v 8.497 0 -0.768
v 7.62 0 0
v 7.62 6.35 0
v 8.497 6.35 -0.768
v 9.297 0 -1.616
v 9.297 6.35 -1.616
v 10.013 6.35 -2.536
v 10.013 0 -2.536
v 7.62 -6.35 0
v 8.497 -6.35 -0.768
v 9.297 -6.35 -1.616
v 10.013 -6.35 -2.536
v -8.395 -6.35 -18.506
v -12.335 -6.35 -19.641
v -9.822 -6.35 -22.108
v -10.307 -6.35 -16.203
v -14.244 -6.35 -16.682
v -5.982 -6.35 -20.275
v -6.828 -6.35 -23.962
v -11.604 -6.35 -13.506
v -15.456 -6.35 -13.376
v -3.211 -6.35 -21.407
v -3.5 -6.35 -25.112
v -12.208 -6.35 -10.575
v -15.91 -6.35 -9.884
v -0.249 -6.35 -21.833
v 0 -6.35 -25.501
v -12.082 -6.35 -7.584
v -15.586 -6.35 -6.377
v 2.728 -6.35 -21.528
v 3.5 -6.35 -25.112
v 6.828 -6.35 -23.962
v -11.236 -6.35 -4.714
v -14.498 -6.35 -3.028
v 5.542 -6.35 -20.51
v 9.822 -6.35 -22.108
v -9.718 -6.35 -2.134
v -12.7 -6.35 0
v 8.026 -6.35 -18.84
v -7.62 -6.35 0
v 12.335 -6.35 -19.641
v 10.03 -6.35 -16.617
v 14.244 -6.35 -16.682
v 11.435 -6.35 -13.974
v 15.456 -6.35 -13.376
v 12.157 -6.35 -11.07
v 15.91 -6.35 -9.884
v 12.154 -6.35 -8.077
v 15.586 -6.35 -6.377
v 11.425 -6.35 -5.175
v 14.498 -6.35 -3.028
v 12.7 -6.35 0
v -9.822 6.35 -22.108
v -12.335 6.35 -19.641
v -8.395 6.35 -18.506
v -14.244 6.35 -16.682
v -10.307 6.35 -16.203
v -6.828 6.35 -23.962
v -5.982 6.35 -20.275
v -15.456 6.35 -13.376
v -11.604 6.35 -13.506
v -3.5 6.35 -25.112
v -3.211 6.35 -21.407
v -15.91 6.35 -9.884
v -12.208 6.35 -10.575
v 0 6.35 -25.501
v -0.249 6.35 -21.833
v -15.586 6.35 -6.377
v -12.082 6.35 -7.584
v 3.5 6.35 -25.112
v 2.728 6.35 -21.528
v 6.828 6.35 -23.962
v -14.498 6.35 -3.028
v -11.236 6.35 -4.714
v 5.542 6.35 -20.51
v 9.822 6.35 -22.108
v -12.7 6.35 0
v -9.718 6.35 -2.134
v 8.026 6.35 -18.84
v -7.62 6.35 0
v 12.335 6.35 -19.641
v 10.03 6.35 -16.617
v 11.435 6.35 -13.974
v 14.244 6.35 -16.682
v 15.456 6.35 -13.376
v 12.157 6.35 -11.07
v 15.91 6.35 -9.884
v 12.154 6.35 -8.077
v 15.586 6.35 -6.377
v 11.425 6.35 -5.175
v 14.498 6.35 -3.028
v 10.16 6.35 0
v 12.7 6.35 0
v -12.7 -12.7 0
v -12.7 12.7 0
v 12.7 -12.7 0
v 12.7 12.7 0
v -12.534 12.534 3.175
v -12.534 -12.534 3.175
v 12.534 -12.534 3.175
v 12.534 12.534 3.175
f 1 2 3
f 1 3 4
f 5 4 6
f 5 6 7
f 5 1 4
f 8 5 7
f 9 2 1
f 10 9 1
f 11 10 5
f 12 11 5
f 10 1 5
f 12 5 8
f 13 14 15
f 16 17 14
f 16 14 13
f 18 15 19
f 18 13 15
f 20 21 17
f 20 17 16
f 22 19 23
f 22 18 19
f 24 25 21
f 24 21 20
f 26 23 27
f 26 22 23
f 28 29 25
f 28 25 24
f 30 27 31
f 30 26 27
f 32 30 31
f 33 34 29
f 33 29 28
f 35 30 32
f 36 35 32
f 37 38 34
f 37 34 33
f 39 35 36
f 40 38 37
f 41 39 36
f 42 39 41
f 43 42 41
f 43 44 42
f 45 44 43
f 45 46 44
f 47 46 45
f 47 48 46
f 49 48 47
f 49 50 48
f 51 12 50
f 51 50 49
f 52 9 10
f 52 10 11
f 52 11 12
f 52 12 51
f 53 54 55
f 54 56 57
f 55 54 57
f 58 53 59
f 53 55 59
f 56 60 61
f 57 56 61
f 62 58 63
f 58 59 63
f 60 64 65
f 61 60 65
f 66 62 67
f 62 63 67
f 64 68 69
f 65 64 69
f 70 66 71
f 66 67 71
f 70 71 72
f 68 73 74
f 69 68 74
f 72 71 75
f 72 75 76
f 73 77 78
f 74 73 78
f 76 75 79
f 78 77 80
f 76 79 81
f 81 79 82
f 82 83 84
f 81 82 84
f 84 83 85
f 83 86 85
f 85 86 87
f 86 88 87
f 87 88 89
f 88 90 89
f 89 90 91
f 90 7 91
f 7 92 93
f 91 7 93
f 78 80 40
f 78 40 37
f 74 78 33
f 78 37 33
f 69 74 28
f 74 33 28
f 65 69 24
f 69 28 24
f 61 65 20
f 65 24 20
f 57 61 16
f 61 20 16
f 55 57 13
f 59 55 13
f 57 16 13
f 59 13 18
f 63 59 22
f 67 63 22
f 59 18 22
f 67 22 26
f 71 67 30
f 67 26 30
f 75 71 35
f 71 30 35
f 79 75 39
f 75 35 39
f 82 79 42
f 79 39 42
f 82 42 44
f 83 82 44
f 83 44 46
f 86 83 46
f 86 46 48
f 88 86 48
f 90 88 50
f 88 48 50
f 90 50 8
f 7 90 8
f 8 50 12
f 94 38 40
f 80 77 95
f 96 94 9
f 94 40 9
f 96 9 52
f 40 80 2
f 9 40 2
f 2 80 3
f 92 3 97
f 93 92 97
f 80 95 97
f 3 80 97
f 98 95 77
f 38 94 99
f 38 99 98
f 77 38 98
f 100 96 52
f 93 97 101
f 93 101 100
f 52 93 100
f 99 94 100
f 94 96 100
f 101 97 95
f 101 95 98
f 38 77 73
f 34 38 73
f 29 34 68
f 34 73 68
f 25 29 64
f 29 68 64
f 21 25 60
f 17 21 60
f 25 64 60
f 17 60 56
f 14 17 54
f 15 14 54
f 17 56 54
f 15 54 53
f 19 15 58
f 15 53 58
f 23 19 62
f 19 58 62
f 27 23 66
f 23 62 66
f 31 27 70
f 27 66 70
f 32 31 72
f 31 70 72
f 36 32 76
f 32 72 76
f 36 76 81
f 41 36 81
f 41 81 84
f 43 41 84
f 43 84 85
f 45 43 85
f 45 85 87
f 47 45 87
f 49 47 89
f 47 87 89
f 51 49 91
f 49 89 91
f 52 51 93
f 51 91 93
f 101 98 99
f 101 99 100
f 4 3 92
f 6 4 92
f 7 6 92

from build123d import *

# Parameters (mm, degrees)
F0_W          = 25.4
F0_H          = 25.4
F1_DEPTH      = 3.175
F1_TAPER      = 3
F3_W          = 5.08
F3_H          = 12.7
F6_DEPTH      = 6.35
F6_DEPTH_BACK = 6.35


with BuildPart() as f1:
    # F0 (on Top) → F1 (new body)
    with BuildSketch(Plane.XY):
        Rectangle(F0_W, F0_H)
    extrude(amount=F1_DEPTH, taper=F1_TAPER)

    # F4: sweep along a path in F2
    with BuildLine(Plane.XZ) as f4_path:
        ThreePointArc((-10.16, 0), (0, -23.5582897328), (10.16, 0))
    # F3 (on face) → F4 (sweep)
    with BuildSketch(Plane(origin=(0, 0, 0), x_dir=(1, 0, 0), z_dir=(0, 0, -1))):
        with Locations((-10.16, 0)):
            Rectangle(F3_W, F3_H)
    sweep(path=f4_path.line)

    # F5 (on Front) → F6 (join, two sides)
    with BuildSketch(Plane.XZ) as f6_sk:
        with BuildLine():
            Line((10.0130578512, -2.535746045), (10.16, 0))
            Line((10.16, 0), (7.62, 0))
            ThreePointArc((7.62, 0), (8.9072265211, -1.1822790439), (10.0130578512, -2.535746045))
        make_face()
    extrude(amount=F6_DEPTH)
    extrude(f6_sk.sketch, amount=-F6_DEPTH_BACK)


solid = f1.part
